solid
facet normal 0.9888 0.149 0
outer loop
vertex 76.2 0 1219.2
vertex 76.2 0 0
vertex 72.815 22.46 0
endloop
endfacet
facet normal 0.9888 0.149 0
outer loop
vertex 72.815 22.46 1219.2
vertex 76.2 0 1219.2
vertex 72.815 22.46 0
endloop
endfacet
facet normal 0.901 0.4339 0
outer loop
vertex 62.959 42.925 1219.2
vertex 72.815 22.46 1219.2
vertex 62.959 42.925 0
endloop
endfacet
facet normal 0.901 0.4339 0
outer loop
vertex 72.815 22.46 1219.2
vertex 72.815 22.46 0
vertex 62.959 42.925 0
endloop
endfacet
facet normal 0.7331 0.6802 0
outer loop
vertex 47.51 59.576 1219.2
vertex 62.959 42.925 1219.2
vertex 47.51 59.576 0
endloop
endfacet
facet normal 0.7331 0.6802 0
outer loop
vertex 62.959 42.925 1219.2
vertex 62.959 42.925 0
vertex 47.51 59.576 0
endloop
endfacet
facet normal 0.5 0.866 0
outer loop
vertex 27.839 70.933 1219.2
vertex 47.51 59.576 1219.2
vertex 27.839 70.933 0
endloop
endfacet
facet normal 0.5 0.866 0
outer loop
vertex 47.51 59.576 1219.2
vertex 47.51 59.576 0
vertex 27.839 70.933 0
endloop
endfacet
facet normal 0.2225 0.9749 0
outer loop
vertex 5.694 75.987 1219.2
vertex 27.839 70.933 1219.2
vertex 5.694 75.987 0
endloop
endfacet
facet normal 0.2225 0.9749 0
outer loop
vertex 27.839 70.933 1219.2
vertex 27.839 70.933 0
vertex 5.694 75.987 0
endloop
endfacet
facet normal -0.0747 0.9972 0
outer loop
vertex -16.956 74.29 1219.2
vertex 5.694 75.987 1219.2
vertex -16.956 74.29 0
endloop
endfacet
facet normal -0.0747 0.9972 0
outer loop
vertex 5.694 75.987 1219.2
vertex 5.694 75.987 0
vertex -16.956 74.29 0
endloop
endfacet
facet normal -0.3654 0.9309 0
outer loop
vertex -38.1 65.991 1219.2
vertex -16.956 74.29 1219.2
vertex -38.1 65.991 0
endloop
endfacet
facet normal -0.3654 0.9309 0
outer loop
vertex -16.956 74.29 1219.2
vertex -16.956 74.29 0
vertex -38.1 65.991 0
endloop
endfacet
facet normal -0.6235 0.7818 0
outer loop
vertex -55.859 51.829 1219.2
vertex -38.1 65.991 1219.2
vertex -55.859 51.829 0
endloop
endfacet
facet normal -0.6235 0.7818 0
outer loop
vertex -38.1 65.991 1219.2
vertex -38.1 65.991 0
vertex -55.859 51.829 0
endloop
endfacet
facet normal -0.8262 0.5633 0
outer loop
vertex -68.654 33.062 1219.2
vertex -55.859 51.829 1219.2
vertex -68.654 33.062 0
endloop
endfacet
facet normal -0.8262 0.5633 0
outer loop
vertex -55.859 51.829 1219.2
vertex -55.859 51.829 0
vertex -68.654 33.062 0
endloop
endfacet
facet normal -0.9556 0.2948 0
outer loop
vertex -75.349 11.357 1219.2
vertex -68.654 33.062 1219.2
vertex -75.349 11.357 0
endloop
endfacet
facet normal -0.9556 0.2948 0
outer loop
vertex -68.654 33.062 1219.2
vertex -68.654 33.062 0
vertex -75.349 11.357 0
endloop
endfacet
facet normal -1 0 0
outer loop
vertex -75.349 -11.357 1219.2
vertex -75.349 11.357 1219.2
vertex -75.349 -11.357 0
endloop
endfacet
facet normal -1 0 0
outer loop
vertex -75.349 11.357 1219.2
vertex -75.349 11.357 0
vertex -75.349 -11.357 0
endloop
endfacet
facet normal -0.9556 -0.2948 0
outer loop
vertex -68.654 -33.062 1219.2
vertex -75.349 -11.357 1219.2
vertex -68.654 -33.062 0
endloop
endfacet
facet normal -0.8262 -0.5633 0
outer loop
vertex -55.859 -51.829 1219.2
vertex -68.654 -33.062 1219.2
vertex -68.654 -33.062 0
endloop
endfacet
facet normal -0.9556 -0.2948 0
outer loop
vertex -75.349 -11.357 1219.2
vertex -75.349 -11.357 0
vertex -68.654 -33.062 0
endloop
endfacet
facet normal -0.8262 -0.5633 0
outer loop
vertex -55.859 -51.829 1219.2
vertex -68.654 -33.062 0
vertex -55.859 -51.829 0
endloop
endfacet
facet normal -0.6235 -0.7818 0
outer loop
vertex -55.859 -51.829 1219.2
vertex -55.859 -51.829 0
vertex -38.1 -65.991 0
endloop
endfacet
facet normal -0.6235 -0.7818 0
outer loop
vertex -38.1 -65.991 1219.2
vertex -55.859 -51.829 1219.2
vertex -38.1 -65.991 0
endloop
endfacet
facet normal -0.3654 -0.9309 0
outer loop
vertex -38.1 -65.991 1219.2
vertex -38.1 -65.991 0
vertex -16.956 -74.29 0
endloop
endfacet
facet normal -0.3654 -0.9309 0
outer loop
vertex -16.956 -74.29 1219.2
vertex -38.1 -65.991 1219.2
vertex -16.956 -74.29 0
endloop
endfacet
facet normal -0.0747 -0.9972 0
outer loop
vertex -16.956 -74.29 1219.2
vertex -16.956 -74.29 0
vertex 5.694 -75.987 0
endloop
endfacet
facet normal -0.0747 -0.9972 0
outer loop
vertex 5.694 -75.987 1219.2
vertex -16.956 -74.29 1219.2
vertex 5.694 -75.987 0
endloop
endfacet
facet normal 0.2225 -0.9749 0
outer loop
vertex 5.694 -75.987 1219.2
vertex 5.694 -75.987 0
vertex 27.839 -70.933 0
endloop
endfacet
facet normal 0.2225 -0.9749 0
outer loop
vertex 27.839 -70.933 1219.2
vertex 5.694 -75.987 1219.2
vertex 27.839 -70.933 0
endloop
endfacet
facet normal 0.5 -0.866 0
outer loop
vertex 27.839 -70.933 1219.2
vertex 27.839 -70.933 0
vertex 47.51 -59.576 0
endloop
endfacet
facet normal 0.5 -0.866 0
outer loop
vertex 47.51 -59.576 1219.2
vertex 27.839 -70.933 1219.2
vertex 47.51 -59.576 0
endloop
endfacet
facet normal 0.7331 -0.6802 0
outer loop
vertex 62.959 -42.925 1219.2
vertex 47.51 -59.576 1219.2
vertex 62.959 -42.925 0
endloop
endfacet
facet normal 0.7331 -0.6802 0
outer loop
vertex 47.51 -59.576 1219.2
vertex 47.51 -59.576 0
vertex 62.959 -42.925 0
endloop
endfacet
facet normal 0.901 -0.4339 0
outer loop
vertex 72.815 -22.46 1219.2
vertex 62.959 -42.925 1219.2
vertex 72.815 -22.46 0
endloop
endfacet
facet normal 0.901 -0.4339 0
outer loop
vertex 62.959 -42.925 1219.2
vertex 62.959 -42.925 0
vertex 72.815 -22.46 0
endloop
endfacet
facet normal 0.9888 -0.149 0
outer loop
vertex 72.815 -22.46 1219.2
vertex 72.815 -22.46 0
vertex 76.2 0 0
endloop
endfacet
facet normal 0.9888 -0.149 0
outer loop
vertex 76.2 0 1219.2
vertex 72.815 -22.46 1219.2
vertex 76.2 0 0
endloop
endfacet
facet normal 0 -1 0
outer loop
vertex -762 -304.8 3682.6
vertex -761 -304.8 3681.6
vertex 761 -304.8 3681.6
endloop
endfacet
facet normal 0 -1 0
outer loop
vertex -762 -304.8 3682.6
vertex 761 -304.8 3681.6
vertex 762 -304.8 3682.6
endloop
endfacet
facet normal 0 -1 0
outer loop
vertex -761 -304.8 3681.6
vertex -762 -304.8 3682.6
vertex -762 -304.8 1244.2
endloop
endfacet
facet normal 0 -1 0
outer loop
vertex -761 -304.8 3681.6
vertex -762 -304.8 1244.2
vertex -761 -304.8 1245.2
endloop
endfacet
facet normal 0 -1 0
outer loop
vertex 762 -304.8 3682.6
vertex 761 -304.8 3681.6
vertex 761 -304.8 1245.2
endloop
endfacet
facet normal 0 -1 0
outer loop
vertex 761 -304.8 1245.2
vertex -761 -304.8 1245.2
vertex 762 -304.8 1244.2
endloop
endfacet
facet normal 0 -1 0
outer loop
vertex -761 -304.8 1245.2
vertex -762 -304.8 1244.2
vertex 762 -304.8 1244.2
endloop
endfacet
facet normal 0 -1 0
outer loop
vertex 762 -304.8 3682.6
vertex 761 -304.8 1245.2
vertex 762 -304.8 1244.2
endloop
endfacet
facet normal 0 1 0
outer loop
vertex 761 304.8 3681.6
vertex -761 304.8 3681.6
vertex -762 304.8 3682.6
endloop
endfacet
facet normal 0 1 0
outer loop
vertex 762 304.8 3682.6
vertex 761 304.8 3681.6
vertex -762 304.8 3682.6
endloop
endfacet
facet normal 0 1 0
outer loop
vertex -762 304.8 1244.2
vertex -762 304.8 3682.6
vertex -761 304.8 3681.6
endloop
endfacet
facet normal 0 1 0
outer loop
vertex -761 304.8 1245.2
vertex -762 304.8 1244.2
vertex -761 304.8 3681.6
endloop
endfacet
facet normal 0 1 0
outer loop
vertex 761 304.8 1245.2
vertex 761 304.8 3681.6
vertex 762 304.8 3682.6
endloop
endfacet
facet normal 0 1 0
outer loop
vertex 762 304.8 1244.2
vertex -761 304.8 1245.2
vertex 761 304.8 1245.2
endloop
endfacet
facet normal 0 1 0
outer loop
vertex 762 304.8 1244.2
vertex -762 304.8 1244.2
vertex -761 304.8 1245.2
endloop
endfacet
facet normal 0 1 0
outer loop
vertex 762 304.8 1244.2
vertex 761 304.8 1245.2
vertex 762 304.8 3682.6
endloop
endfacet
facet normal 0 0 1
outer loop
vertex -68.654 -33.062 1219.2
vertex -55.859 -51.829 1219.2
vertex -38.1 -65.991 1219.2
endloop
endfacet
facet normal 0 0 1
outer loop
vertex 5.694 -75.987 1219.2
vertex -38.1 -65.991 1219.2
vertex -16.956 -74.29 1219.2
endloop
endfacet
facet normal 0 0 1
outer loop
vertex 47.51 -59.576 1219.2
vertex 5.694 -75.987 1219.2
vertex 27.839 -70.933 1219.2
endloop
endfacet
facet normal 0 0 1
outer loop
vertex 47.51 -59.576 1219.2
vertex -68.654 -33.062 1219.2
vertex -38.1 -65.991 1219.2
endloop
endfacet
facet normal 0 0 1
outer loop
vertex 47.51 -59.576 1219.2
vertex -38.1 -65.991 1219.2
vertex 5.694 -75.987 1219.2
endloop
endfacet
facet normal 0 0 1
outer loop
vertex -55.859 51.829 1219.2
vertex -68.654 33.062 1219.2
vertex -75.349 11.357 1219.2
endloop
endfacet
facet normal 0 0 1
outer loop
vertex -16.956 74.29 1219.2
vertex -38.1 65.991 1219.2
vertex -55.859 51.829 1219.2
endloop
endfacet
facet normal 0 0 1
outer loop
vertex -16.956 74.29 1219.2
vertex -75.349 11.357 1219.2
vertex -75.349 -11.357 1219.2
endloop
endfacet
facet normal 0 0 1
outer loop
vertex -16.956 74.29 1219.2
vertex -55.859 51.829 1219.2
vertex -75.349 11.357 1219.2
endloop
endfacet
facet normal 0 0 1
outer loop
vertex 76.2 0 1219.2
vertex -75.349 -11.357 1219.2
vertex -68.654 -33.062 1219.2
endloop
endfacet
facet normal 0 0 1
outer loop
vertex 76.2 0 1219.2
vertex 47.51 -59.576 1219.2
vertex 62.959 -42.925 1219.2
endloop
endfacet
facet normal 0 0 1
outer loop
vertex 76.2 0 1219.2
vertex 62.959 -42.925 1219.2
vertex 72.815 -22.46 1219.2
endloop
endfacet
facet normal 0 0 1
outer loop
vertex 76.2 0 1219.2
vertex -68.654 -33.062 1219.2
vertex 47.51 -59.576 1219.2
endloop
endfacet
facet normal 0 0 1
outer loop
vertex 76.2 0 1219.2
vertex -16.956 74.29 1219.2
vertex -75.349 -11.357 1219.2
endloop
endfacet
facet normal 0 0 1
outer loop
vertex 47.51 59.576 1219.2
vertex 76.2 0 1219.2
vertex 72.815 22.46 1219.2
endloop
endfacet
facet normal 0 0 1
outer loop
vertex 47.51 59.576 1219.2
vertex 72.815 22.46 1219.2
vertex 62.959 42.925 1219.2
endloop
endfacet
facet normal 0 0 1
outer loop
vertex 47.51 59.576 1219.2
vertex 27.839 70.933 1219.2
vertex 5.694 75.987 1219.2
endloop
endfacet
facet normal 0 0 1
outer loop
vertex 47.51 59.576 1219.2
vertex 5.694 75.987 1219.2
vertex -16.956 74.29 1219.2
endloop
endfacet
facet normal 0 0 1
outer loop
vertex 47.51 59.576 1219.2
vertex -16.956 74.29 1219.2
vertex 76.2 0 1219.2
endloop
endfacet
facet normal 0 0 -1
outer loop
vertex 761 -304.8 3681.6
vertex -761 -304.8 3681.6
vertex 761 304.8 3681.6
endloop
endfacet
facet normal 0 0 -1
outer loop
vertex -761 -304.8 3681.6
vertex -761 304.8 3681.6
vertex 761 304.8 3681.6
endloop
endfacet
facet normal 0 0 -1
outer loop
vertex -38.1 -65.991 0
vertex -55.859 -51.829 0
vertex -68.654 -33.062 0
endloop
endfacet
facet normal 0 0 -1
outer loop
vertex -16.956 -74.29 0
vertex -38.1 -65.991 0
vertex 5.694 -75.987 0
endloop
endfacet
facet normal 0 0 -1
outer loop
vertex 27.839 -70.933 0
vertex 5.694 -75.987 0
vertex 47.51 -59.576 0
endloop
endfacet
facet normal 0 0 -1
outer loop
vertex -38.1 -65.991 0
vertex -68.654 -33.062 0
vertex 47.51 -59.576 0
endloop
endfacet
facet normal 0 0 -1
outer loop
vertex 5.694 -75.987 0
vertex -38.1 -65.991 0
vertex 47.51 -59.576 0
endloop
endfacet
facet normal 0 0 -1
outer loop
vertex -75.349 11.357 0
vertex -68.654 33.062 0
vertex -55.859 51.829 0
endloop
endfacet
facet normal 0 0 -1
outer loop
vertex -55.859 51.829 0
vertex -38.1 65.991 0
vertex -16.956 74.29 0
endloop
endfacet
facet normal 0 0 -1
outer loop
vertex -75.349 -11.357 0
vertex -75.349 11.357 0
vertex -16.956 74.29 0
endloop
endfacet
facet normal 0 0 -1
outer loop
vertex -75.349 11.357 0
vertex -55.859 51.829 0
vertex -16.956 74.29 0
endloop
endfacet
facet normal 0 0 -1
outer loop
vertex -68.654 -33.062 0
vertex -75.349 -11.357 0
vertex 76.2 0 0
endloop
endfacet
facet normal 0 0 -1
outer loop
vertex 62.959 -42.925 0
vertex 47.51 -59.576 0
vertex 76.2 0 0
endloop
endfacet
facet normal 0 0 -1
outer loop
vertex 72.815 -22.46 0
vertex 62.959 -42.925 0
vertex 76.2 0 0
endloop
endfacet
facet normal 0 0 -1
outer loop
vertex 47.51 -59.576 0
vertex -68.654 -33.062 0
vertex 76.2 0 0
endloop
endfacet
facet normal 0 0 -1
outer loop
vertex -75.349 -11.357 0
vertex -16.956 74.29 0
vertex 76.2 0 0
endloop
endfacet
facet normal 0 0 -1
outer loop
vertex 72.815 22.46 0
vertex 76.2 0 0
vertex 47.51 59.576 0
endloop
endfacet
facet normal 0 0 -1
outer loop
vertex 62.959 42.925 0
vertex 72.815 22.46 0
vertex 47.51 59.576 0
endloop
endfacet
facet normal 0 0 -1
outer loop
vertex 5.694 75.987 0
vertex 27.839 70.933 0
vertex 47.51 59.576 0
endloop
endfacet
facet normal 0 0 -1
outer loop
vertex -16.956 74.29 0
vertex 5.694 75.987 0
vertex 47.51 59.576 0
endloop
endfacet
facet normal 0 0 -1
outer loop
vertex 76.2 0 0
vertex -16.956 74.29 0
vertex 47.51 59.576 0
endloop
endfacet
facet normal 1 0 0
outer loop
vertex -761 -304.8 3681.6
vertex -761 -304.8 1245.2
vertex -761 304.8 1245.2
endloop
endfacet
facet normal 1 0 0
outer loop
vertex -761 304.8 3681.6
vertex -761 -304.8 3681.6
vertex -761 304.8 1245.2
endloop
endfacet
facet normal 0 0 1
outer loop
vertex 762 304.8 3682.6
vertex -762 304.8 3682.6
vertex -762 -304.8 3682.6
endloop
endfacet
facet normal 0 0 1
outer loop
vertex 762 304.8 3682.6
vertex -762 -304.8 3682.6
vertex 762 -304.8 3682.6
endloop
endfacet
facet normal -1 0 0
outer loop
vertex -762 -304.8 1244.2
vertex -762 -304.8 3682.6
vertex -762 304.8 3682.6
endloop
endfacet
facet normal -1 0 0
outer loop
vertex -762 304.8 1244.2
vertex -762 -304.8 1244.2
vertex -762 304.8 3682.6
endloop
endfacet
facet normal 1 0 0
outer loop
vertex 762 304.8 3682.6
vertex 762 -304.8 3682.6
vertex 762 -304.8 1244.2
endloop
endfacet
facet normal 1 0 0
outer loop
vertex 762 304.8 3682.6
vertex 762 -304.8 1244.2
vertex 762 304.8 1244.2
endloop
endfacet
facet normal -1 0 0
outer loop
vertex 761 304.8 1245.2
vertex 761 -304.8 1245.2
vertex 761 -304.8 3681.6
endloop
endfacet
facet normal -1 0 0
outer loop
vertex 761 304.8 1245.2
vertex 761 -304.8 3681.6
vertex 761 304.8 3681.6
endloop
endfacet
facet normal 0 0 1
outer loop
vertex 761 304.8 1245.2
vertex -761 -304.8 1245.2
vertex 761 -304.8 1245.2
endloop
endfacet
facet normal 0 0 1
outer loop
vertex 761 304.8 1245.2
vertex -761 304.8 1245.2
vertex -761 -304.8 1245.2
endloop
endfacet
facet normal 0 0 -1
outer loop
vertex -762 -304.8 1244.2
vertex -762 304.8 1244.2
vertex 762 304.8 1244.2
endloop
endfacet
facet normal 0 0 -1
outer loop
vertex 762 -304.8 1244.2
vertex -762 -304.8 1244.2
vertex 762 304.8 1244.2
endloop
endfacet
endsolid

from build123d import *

# Parameters (mm, degrees)
F0_R     = 76.2
F1_DEPTH = 1219.2
F3_W     = 1524
F3_H     = 609.6
F4_DEPTH = 2438.4
F5_T     = -1


# Not quite as in the source:
# - the program builds the solid bodies; features that only make, move or delete a surface that nothing else refers to are left out


with BuildPart() as f1:
    # F0 (on Top) → F1 (new body)
    with BuildSketch(Plane.XY):
        Circle(F0_R)
    extrude(amount=F1_DEPTH)


with BuildPart() as f4:
    # F3 (on offset) → F4 (new body)
    with BuildSketch(Plane.XY.offset(1244.2)):
        Rectangle(F3_W, F3_H)
    extrude(amount=F4_DEPTH)

    # F5
    f5_openings = [f4.faces().sort_by_distance(p)[0] for p in [
        (0, -304.8, 2463.4),
        (0, 304.8, 2463.4),
    ]]
    offset(amount=F5_T, openings=f5_openings)


solid = Compound([f1.part, f4.part])
